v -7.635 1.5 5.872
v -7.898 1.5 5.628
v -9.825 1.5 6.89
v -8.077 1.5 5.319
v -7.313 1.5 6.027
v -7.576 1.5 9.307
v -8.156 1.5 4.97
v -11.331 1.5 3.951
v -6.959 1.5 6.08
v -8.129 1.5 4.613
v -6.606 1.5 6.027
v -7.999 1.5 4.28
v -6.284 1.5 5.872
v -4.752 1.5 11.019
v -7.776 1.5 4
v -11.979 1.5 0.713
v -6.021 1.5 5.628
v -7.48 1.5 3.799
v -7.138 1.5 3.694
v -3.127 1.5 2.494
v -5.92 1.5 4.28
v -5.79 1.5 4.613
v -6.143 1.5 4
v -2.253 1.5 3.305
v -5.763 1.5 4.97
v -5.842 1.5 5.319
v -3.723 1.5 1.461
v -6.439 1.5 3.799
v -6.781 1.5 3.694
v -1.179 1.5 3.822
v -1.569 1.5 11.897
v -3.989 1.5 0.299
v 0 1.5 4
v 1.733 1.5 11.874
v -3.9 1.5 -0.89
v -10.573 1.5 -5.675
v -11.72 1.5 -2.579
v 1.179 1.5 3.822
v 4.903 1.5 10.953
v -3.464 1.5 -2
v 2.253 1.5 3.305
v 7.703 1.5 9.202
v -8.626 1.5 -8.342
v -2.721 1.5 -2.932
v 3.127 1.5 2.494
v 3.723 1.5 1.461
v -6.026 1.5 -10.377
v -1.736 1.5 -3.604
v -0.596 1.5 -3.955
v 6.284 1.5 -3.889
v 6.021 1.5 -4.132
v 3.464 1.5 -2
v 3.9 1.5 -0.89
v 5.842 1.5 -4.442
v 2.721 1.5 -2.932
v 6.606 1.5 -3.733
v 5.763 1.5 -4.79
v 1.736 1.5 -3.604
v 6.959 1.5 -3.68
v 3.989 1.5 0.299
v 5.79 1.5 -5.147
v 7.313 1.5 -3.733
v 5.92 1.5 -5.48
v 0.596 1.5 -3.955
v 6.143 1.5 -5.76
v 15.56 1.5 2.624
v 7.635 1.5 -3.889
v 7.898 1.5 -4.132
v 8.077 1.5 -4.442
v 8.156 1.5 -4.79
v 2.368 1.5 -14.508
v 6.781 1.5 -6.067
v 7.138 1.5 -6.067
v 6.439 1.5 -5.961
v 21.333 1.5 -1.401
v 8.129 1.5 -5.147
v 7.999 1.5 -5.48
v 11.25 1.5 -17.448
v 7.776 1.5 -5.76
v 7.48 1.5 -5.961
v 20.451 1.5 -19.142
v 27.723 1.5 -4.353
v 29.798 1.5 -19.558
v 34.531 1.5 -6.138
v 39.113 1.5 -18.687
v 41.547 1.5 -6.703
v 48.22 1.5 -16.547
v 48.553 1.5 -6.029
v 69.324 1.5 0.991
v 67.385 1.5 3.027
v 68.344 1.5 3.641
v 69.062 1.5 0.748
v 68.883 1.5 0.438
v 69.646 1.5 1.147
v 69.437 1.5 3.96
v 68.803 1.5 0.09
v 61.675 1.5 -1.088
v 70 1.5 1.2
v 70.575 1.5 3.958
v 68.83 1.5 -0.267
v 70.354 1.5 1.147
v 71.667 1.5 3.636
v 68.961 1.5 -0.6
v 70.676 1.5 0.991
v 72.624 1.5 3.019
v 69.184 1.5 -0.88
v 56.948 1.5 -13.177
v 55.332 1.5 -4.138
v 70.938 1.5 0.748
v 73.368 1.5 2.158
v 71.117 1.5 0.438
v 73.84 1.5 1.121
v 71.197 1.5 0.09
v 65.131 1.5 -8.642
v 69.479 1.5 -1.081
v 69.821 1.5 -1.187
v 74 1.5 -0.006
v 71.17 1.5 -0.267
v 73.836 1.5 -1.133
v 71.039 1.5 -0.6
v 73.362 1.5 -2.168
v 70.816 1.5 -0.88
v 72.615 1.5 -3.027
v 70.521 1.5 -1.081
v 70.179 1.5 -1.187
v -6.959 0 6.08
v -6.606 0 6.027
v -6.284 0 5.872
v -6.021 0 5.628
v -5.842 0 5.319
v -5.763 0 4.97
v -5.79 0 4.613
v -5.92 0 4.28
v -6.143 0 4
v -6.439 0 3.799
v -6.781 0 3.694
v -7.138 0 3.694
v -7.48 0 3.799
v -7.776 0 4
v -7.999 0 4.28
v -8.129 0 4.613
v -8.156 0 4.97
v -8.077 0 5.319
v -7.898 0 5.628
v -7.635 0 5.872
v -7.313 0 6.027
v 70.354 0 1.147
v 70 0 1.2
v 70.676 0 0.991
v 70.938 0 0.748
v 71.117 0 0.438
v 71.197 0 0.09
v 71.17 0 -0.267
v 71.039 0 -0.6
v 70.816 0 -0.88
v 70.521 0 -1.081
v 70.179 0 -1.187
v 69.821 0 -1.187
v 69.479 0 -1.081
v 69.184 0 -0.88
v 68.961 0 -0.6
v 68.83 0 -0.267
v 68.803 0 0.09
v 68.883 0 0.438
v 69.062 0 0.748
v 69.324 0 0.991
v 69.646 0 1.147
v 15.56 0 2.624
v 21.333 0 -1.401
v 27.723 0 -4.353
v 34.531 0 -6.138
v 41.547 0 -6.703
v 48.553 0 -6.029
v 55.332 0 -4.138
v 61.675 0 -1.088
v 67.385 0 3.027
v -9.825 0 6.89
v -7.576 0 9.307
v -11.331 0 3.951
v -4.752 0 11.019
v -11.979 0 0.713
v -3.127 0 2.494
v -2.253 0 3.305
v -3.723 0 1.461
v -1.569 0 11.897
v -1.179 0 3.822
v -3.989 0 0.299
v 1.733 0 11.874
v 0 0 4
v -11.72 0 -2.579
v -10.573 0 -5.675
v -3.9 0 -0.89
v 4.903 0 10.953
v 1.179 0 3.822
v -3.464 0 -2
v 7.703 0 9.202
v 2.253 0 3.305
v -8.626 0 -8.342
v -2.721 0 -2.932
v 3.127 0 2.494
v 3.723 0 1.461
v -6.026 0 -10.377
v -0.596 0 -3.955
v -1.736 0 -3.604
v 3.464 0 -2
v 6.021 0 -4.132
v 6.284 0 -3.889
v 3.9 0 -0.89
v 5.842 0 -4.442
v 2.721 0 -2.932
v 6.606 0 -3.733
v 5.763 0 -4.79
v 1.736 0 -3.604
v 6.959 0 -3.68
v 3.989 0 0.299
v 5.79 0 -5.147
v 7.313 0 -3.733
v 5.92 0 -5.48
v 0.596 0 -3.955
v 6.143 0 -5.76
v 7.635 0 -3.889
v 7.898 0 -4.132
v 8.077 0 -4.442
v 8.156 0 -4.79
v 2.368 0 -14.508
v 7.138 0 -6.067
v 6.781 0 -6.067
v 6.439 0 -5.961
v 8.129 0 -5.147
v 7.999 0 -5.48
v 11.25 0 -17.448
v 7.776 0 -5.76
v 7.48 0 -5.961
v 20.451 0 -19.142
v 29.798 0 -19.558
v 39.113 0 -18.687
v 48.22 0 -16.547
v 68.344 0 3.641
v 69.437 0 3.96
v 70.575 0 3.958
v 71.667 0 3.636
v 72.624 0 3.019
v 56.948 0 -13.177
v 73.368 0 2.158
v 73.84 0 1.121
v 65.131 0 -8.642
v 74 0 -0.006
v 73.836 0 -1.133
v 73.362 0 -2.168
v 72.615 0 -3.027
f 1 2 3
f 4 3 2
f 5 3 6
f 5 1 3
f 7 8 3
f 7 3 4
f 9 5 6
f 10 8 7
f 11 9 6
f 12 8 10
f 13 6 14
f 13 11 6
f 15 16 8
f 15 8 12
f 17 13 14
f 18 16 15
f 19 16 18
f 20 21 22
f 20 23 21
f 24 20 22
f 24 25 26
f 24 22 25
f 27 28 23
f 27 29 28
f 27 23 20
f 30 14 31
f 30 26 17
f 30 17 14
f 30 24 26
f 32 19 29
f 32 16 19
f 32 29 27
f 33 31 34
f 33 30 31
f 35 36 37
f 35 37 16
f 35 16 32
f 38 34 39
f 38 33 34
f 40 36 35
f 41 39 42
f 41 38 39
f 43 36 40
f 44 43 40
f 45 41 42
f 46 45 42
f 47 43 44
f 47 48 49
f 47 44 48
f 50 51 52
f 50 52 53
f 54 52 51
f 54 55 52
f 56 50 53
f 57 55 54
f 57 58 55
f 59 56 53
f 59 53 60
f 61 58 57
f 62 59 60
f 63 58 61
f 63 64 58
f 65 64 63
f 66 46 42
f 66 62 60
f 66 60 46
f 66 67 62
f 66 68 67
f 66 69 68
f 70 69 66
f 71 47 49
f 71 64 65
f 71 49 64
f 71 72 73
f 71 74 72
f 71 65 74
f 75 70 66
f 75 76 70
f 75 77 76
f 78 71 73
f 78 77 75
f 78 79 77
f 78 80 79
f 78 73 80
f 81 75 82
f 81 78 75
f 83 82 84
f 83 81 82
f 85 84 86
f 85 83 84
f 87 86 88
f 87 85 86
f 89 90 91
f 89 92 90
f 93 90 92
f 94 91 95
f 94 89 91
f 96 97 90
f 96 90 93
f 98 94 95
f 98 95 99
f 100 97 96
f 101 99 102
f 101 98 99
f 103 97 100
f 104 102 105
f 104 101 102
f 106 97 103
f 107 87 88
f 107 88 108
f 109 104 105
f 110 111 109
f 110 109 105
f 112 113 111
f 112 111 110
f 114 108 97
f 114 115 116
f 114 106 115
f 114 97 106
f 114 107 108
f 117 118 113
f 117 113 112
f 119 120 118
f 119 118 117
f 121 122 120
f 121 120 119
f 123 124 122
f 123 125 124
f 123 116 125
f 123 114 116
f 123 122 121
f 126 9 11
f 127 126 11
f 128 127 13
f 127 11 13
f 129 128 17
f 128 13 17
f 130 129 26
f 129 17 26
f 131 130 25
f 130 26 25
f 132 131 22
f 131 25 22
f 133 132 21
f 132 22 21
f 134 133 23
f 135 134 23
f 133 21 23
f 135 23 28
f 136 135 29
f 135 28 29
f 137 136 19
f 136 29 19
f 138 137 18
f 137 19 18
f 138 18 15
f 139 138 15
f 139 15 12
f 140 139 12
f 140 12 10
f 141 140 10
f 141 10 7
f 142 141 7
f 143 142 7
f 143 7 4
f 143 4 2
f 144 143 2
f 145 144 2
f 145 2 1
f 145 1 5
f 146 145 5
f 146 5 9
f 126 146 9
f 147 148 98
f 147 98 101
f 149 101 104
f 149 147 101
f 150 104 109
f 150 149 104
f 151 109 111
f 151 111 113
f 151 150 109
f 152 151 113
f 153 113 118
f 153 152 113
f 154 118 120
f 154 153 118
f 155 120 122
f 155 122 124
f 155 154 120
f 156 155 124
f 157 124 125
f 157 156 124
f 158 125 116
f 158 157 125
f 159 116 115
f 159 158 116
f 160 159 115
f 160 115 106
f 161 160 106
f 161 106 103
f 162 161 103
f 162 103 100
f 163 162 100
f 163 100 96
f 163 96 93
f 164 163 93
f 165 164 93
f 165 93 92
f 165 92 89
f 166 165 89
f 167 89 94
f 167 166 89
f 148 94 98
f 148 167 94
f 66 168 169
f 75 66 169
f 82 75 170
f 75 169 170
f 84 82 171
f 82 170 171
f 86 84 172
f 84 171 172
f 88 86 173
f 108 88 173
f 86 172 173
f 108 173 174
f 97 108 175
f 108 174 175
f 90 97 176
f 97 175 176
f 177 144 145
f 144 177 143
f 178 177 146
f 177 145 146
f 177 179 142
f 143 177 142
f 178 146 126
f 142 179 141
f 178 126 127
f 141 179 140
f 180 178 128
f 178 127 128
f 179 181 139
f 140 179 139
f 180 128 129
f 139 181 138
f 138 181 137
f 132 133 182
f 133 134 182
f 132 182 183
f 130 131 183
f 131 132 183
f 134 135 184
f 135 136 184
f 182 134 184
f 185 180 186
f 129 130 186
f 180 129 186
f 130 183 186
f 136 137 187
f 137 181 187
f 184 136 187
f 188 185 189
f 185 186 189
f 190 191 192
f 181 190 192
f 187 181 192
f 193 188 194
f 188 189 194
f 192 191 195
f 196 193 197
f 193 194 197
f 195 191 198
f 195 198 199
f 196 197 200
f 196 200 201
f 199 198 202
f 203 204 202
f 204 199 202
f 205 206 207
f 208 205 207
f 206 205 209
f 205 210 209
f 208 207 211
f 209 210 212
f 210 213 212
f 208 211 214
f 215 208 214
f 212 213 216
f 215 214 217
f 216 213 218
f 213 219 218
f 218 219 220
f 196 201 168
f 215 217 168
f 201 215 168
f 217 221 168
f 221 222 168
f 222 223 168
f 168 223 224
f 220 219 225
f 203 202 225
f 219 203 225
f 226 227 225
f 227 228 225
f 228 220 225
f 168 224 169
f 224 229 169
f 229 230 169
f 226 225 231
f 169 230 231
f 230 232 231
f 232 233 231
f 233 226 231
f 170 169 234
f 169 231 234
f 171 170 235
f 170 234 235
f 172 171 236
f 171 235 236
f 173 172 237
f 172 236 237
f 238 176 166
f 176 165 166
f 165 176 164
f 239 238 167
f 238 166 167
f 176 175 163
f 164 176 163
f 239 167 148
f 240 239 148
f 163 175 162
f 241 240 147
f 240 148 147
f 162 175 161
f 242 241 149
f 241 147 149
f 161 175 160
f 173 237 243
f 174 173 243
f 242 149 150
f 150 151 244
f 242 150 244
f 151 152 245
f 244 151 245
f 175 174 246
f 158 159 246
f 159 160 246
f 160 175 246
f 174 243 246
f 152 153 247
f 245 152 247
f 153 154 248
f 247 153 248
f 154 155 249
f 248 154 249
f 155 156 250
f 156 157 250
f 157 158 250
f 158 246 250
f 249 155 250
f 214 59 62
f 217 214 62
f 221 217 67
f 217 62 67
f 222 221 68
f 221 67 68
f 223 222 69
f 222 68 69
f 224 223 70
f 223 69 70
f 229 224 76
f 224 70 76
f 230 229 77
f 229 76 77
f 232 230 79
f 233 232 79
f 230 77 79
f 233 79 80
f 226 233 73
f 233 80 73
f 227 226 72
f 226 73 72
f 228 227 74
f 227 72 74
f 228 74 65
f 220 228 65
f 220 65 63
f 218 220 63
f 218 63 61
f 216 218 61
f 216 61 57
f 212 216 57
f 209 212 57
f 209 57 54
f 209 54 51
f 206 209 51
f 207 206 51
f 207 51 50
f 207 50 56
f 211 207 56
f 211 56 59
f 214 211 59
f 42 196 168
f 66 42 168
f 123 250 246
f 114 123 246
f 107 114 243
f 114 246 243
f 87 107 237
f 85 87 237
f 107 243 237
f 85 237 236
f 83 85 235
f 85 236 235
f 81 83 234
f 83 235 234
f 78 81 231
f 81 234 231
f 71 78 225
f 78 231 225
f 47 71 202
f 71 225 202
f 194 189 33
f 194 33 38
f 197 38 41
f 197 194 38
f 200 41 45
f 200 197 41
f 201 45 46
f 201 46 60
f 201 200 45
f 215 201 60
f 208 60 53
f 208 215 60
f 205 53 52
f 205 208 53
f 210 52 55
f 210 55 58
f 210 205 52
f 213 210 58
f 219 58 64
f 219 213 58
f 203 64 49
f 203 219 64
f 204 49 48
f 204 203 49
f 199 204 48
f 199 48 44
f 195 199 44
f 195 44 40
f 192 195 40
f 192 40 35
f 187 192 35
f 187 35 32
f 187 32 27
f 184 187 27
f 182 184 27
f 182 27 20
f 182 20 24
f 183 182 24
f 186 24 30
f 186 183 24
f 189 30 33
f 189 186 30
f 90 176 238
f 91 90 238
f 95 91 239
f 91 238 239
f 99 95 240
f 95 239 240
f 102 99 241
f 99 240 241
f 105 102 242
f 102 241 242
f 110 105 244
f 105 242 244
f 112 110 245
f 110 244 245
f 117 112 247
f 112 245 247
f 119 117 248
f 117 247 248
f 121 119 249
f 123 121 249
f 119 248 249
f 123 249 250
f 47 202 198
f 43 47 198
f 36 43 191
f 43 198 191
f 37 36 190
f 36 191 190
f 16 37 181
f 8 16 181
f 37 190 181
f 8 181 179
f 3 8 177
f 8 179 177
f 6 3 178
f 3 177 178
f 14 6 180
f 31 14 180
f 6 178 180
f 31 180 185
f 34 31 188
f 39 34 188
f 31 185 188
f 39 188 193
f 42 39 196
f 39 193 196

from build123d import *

# Parameters (mm, degrees)
ESQUISSE1_R             = 4
ESQUISSE1_R_2           = 1.2
BOSS_EXTRU_1_DEPTH      = 1.5
ESQUISSE2_R             = 1.2
ENL_V_MAT_EXTRU_1_DEPTH = 77.560702478


with BuildPart() as part:
    # Esquisse1 → Boss.-Extru.1 (new body)
    with BuildSketch(Plane(origin=(0, 0, 0), x_dir=(1, 0, 0), z_dir=(0, 1, 0))):
        with BuildLine():
            Line((7.702709274, -9.201536276), (15.560016707, -2.624096052))
            ThreePointArc((15.560016707, -2.624096052), (41.546598932, 6.702908226), (67.385064935, -3.026898513))
            ThreePointArc((67.385064935, -3.026898513), (73.026898513, -2.614935065), (72.614935065, 3.026898513))
            ThreePointArc((72.614935065, 3.026898513), (34.4702408, 19.282589401), (-6.02615989, 10.377157462))
            ThreePointArc((-6.02615989, 10.377157462), (-9.825172598, -6.889556112), (7.702709274, -9.201536276))
        make_face()
        with Locations(Location((0, 0, 0), (0, 0, 270))):
            Circle(ESQUISSE1_R, mode=Mode.SUBTRACT)
        with Locations(Location((70, 0, 0), (0, 0, 270))):
            Circle(ESQUISSE1_R_2, mode=Mode.SUBTRACT)
    extrude(amount=BOSS_EXTRU_1_DEPTH)

    # Esquisse2 → Enlèv. mat.-Extru.1 (cut, through all)
    with BuildSketch(Plane(origin=(0, 1.5, 0), x_dir=(1, 0, 0), z_dir=(0, 1, 0))):
        with Locations(Location((-6.959497257, -4.880102246, 0), (0, 0, 270))):
            Circle(ESQUISSE2_R)
        with Locations(Location((6.959497257, 4.880102246, 0), (0, 0, 270))):
            Circle(ESQUISSE2_R)
    extrude(amount=-ENL_V_MAT_EXTRU_1_DEPTH, mode=Mode.SUBTRACT)


solid = part.part
